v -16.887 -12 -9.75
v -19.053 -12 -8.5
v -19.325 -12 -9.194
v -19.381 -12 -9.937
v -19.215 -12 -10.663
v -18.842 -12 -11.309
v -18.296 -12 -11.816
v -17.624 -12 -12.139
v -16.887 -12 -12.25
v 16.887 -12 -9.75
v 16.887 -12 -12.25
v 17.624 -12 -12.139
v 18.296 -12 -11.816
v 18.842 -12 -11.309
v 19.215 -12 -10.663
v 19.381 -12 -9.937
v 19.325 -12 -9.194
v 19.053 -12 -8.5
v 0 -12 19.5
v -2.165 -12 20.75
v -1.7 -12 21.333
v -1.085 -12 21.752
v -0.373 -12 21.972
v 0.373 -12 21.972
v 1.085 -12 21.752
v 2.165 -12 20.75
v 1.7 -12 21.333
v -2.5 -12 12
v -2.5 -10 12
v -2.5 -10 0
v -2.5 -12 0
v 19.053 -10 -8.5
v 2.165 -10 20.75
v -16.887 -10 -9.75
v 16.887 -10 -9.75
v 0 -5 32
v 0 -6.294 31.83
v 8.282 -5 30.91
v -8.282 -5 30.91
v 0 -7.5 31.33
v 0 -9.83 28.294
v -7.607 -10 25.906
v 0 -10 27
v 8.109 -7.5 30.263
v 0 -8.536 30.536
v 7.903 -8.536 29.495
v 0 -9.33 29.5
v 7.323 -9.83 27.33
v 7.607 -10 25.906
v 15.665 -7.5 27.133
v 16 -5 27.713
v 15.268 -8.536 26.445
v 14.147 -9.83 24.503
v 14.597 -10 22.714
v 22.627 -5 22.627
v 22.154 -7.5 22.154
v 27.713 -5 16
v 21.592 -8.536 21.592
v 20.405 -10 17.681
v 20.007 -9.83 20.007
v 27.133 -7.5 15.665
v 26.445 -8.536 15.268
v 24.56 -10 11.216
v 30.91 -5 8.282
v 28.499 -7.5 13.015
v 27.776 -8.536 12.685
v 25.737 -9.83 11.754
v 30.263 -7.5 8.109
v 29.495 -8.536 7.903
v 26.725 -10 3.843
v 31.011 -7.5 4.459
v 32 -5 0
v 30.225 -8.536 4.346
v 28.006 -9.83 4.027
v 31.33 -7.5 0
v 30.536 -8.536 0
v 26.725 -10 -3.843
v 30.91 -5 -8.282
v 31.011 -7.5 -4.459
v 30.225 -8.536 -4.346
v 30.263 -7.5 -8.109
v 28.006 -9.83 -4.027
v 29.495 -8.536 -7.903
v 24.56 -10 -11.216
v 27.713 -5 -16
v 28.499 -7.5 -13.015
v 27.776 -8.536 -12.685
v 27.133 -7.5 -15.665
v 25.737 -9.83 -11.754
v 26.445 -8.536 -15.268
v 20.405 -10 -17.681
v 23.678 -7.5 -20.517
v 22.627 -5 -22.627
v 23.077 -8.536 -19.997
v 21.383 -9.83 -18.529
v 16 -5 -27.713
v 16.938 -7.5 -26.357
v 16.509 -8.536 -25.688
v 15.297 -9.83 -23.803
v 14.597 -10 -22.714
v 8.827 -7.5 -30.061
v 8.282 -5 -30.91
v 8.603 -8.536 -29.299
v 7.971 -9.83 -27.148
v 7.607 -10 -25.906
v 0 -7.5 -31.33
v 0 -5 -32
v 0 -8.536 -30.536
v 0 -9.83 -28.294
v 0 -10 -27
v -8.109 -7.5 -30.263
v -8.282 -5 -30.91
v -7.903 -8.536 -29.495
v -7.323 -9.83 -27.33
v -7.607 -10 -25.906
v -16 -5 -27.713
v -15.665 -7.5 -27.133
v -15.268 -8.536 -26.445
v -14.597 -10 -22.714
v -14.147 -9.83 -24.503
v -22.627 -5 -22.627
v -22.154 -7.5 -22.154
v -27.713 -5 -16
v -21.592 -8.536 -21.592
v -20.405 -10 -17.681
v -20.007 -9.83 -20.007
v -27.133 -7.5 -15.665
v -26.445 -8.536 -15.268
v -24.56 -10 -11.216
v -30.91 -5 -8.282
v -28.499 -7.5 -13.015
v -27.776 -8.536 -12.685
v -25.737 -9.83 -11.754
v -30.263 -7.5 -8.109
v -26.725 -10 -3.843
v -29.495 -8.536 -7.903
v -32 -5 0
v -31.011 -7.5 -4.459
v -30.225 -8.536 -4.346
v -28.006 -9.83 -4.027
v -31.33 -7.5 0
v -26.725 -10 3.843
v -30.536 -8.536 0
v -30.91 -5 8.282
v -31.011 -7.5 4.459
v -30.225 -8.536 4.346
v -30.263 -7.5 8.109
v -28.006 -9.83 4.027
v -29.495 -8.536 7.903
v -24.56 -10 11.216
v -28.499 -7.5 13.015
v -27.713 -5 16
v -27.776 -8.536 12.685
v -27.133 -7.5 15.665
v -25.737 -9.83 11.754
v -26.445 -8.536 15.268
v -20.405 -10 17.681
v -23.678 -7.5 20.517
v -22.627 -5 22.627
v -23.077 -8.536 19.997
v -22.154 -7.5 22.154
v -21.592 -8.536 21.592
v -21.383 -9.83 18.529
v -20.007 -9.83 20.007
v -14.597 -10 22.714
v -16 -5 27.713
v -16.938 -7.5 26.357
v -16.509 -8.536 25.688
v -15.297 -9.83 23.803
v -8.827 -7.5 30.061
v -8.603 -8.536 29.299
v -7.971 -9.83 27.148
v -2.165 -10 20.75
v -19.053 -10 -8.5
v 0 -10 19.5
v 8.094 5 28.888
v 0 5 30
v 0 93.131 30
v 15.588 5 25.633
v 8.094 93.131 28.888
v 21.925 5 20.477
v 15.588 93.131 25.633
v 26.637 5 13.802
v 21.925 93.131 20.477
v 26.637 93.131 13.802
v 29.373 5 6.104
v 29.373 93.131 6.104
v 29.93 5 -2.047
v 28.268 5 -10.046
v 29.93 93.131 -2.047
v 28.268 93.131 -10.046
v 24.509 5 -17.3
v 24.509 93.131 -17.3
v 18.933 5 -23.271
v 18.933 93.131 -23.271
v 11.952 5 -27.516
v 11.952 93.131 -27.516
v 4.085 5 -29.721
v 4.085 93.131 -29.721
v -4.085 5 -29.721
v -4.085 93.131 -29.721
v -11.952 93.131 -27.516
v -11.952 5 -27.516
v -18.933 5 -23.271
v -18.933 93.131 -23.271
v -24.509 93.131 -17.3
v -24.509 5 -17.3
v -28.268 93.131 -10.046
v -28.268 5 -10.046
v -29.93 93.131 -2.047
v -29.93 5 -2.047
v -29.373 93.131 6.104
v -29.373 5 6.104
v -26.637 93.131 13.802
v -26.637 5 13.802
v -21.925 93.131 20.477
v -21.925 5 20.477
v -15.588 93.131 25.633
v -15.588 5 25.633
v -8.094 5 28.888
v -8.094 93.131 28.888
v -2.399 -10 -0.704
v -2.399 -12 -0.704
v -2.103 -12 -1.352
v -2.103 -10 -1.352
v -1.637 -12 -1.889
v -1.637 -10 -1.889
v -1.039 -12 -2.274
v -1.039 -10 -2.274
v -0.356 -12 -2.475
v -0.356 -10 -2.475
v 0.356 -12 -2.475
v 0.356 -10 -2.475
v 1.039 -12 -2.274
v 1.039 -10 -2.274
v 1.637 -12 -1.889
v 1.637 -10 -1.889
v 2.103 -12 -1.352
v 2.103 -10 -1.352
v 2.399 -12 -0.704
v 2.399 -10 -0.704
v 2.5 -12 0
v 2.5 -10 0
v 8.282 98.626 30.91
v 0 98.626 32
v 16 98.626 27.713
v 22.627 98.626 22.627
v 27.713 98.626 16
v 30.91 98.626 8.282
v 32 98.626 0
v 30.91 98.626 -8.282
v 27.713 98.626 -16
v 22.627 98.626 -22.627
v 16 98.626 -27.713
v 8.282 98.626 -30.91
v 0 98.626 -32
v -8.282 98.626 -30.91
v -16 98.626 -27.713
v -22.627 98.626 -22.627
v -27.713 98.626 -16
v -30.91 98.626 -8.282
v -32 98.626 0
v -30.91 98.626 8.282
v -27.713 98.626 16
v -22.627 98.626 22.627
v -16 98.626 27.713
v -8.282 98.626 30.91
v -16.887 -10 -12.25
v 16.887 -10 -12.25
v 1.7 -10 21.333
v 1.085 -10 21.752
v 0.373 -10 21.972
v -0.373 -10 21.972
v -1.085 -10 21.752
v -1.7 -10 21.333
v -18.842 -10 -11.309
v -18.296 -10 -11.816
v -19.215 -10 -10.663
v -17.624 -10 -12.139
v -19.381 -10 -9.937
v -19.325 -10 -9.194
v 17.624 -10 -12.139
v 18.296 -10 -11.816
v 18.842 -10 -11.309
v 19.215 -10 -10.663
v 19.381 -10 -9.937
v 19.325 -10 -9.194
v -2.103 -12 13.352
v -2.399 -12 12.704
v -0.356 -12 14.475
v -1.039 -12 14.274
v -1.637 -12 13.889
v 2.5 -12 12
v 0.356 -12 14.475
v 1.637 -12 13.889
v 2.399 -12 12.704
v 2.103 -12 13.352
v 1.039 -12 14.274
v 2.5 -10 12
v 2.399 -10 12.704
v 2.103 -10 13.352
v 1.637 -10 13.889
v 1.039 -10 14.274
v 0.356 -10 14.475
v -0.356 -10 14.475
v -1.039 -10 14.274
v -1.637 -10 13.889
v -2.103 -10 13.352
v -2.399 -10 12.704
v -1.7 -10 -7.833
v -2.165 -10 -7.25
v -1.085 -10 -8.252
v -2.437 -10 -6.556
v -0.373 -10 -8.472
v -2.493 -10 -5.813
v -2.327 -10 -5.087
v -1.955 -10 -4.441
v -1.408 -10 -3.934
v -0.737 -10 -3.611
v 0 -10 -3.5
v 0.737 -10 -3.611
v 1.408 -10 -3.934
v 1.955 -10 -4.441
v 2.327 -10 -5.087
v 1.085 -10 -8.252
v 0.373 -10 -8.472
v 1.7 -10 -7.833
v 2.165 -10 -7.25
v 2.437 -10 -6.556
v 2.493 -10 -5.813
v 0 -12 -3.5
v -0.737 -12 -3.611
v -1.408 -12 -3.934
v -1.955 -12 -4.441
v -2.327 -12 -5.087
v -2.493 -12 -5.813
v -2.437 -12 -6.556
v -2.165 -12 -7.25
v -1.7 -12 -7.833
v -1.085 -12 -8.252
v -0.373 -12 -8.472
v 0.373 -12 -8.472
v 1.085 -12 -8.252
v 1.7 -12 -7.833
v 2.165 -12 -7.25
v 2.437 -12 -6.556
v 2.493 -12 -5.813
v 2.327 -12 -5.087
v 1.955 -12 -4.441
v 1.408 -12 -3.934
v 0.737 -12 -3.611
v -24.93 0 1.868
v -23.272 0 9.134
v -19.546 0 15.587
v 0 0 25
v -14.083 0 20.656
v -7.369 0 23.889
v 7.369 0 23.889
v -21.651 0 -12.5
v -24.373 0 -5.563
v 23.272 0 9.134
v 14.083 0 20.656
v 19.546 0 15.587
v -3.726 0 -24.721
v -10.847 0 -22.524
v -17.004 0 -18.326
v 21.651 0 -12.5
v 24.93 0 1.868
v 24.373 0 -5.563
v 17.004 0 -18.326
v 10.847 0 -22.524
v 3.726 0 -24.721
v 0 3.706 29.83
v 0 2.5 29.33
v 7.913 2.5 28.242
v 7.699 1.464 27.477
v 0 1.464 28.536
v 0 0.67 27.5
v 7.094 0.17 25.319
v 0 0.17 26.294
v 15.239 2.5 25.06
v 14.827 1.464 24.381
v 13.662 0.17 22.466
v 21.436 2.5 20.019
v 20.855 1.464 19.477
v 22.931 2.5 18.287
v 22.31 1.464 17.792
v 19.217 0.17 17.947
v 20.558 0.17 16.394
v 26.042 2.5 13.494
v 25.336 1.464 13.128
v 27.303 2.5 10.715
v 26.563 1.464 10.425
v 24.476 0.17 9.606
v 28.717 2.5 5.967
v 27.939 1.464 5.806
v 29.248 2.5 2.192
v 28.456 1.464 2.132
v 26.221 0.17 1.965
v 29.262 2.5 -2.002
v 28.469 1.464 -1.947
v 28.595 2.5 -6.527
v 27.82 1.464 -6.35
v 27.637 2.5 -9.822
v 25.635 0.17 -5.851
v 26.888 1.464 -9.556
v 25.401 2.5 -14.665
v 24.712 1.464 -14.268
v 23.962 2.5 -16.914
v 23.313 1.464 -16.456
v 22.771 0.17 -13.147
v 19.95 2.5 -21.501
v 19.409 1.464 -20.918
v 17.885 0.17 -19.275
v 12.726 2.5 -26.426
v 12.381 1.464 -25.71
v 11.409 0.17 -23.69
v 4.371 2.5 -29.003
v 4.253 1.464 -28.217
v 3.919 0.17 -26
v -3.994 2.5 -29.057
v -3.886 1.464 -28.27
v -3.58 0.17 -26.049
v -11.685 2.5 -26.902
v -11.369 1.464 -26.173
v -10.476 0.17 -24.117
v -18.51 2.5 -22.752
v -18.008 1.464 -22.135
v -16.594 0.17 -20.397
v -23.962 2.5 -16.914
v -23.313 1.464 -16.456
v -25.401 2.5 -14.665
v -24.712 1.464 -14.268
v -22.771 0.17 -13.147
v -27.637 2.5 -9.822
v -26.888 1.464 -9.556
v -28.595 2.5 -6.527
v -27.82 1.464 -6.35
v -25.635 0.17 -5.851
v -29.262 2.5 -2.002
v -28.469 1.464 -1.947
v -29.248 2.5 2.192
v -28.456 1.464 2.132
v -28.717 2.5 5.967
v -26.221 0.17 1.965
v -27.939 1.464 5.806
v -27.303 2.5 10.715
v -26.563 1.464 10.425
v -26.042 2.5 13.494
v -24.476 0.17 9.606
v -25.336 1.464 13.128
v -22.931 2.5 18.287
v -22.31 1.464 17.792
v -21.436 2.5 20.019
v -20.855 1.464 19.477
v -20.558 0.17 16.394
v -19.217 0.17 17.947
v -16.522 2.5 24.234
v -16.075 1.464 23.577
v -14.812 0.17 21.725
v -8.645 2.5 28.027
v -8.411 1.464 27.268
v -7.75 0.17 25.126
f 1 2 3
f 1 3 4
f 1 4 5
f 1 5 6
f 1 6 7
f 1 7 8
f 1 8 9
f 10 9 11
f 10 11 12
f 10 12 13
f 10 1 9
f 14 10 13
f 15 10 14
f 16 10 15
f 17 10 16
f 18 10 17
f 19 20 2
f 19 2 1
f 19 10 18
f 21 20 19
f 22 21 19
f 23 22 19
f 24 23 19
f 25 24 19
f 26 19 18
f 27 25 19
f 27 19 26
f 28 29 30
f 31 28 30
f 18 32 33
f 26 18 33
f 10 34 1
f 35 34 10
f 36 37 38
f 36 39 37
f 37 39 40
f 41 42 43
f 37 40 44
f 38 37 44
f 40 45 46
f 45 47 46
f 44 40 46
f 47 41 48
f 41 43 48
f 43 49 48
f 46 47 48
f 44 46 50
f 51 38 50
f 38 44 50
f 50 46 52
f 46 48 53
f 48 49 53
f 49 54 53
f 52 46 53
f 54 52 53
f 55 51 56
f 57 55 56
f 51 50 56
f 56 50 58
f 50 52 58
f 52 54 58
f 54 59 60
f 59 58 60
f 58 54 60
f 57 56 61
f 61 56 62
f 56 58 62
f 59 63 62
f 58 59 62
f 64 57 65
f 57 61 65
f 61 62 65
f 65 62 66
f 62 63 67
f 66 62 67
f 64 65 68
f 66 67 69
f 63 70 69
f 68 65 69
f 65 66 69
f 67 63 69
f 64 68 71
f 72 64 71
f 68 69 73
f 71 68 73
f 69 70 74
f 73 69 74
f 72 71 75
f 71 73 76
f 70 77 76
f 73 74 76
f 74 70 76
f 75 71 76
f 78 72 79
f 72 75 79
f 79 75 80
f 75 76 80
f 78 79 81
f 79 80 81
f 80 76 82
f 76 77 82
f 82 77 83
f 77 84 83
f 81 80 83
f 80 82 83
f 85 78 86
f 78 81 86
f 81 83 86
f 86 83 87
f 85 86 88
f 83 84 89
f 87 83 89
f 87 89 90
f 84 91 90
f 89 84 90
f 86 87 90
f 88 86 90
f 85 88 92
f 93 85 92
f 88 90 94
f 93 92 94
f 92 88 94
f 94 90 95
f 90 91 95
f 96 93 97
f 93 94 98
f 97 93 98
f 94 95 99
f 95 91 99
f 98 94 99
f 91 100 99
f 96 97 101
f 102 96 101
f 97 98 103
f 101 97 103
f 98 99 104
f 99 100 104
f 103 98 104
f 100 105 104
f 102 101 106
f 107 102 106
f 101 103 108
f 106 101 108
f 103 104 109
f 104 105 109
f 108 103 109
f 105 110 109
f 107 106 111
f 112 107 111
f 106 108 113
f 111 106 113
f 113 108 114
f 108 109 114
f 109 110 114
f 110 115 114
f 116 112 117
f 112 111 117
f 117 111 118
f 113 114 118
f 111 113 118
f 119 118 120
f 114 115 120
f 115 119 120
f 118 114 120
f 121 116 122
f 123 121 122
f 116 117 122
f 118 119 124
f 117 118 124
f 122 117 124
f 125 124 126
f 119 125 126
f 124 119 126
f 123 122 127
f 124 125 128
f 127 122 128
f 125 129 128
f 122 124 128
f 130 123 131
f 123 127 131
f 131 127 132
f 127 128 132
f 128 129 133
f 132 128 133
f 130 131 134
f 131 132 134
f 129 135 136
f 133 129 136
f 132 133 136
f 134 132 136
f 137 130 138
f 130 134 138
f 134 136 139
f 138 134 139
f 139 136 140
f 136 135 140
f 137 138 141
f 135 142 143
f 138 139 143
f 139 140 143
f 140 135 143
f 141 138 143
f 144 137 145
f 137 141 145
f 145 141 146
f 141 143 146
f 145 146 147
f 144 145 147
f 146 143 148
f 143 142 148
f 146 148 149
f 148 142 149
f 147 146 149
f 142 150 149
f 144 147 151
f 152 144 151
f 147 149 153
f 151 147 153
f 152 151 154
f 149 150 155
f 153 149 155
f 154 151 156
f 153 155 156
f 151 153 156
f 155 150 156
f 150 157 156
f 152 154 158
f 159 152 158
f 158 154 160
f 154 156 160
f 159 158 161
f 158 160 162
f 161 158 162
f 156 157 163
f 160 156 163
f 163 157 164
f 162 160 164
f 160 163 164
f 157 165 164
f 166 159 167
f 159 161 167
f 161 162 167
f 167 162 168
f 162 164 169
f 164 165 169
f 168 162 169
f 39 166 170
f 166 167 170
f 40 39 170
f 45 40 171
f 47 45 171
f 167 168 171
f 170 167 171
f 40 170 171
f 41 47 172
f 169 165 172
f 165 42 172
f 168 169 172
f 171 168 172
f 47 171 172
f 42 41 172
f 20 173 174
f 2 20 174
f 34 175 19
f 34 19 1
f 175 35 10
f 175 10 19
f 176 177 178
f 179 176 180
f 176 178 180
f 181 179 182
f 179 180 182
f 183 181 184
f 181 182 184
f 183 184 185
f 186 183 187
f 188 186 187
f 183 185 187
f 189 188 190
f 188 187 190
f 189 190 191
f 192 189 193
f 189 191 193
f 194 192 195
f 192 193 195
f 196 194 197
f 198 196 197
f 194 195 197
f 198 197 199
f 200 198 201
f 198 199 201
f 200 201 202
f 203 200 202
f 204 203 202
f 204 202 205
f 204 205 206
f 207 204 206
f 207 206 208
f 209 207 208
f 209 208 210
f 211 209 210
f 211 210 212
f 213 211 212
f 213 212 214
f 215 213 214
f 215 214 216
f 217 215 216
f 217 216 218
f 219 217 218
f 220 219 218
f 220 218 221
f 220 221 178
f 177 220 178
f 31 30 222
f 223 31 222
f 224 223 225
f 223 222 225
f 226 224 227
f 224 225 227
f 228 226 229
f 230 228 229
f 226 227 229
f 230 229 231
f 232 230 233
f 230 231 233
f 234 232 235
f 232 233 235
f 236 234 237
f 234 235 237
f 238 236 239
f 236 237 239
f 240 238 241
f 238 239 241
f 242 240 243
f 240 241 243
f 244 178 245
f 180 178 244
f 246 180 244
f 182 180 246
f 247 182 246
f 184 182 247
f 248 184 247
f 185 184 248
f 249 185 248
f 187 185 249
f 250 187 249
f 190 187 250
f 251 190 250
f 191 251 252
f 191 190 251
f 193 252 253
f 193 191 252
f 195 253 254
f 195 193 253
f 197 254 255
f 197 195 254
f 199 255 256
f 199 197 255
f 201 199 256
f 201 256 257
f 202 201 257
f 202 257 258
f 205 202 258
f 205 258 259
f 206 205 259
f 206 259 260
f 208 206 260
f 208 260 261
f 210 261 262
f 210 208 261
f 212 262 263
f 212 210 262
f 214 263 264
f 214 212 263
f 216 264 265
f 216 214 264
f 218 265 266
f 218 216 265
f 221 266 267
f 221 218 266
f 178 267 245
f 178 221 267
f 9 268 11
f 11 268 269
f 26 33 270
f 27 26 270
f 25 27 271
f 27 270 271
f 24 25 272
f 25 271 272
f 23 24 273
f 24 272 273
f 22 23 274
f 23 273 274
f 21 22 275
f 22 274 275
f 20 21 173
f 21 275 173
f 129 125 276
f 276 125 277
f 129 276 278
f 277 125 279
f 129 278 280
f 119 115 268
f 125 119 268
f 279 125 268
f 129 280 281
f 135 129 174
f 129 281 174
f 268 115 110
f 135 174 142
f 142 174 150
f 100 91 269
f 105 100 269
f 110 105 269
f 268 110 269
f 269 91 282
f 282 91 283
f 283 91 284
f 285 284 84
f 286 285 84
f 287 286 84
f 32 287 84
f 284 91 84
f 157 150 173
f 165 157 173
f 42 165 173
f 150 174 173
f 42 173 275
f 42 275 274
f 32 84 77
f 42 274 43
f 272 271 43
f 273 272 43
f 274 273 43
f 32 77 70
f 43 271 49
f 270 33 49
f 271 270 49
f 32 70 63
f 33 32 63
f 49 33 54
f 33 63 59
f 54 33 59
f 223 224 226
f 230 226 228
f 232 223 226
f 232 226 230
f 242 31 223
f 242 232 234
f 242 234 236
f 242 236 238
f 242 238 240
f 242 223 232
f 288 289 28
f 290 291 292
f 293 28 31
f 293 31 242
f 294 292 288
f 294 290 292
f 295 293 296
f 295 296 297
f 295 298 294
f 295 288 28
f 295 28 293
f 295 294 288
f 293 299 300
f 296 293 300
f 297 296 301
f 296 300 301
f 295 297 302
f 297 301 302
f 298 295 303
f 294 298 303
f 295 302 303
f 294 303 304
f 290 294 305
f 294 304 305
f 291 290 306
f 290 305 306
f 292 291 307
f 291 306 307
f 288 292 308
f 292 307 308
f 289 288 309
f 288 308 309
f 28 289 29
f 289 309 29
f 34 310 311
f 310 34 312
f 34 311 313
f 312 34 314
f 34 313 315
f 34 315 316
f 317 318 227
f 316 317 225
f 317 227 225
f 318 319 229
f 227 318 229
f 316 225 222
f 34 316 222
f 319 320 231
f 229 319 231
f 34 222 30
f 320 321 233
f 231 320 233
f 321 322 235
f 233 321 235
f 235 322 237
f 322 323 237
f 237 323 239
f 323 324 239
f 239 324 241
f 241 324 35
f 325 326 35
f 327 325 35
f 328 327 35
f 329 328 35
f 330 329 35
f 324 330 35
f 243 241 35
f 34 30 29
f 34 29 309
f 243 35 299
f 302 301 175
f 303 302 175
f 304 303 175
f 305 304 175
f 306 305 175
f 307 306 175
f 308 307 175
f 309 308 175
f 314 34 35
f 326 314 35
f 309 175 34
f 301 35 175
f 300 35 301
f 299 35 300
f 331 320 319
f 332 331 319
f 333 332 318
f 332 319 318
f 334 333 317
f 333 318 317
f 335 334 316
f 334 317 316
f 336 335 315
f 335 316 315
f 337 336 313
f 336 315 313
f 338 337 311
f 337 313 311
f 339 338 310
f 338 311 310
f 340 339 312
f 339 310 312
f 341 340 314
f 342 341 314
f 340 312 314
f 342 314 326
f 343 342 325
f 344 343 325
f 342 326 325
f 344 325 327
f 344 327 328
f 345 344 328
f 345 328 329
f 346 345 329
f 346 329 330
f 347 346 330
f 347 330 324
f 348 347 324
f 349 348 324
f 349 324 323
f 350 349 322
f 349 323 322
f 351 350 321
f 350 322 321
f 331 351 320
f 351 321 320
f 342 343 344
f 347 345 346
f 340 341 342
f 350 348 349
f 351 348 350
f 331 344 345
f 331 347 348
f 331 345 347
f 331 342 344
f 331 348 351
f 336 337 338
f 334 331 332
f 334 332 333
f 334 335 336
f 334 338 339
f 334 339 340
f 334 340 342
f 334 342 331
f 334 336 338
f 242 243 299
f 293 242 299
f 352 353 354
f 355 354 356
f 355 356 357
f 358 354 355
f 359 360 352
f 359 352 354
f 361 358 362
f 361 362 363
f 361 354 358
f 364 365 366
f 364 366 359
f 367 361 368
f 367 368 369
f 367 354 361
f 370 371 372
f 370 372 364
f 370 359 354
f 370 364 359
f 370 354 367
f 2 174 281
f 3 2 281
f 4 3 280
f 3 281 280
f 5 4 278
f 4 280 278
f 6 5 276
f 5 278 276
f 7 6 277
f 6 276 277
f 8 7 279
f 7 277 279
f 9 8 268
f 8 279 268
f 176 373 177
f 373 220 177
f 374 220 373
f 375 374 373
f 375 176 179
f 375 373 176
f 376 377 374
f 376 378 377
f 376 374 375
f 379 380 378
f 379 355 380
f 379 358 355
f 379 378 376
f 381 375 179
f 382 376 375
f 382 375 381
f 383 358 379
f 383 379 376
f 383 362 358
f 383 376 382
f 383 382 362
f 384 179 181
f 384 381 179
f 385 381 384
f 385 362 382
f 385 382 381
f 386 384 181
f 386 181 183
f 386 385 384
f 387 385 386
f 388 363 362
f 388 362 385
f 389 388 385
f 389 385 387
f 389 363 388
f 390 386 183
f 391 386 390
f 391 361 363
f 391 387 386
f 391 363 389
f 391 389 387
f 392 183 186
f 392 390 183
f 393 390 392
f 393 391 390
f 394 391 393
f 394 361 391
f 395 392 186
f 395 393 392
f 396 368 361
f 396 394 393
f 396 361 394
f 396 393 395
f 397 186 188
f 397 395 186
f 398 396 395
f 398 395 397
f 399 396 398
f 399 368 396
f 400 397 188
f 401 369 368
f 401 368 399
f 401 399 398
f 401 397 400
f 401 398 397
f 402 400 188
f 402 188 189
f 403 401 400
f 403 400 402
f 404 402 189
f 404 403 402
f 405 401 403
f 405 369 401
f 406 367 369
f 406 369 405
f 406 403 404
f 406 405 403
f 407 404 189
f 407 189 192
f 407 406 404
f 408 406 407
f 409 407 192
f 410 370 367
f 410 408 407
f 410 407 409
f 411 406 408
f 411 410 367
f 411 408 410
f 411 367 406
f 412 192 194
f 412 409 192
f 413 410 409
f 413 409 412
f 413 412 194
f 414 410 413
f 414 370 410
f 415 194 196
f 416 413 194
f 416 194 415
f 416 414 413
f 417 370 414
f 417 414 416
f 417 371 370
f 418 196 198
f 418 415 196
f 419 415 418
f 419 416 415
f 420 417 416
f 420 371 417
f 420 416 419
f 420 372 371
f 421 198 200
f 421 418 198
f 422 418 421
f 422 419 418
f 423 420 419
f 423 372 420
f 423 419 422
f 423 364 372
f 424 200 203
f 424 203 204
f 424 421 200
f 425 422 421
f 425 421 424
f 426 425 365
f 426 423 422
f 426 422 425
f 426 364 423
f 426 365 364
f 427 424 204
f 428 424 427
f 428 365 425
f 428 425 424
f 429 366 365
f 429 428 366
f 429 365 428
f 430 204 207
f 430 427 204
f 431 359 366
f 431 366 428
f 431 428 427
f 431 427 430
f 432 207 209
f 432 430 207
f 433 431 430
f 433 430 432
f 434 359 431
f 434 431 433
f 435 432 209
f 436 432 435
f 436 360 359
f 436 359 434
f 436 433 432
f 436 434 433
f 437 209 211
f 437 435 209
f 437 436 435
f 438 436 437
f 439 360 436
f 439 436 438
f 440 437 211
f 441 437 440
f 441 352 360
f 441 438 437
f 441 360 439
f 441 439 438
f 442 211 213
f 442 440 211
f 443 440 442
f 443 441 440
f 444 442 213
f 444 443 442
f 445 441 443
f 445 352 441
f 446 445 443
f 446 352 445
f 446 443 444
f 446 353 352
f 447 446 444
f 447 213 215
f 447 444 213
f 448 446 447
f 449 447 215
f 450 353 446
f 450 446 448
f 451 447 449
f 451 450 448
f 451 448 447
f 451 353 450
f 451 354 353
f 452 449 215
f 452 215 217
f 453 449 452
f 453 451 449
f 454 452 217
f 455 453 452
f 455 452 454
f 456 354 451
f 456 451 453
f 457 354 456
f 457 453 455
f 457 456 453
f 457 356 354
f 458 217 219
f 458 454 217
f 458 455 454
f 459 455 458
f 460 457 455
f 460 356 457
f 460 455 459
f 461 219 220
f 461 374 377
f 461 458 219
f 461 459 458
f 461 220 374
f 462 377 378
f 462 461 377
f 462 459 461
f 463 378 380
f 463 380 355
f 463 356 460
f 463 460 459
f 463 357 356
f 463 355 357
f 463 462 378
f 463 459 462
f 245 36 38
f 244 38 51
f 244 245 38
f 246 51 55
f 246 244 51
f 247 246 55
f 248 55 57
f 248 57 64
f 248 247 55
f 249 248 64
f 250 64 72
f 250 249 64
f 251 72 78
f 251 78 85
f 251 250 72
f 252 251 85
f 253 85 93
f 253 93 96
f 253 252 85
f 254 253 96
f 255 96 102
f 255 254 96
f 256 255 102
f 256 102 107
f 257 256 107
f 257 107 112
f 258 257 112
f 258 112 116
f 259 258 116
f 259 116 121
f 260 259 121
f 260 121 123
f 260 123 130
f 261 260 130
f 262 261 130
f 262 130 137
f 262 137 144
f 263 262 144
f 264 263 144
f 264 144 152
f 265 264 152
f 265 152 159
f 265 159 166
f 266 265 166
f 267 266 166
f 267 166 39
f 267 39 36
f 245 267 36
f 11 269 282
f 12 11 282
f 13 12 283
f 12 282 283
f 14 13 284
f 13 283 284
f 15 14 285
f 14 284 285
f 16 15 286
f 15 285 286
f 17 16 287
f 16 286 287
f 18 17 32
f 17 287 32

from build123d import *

# Parameters (mm, degrees)
SKETCH1_R           = 32
SKETCH1_R_2         = 30
BOSS_EXTRUDE1_DEPTH = 10
BOSS_EXTRUDE2_START = 100
SKETCH1_3_R         = 32
SKETCH1_3_R_2       = 30
BOSS_EXTRUDE2_DEPTH = 100
FILLET1_R           = 5
FILLET2_R           = 5
SKETCH2_R           = 2.5
BOSS_EXTRUDE3_DEPTH = 2
CHAMFER1_SIZE       = 2.5
CHAMFER1_SIZE_2     = 6.868693549


with BuildPart() as part:
    # Sketch1 → Boss-Extrude1 (new body)
    # profile 1 of 2: a face of its own
    with BuildSketch(Plane(origin=(0, 0, 0), x_dir=(1, 0, 0), z_dir=(0, 1, 0))):
        with Locations(Location((0, 0, 0), (0, 0, 270))):
            Circle(SKETCH1_R)
        Circle(SKETCH1_R_2, mode=Mode.SUBTRACT)
    # profile 2 of 2: a face of its own
    with BuildSketch(Plane(origin=(0, 0, 0), x_dir=(1, 0, 0), z_dir=(0, 1, 0))):
        Circle(SKETCH1_R_2)
    extrude(amount=-BOSS_EXTRUDE1_DEPTH)

    # Sketch1<3> → Boss-Extrude2 (add)
    with BuildSketch(Plane(origin=(0, 0, 0), x_dir=(1, 0, 0), z_dir=(0, 1, 0)).offset(BOSS_EXTRUDE2_START)):
        with Locations(Location((0, 0, 0), (0, 0, 270))):
            Circle(SKETCH1_3_R)
        with Locations(Location((0, 0, 0), (0, 0, 270))):
            Circle(SKETCH1_3_R_2, mode=Mode.SUBTRACT)
    extrude(amount=-BOSS_EXTRUDE2_DEPTH)

    # Fillet1
    fillet1_edges = [part.edges().sort_by_distance(p)[0] for p in [
        (0, 0, -30),
    ]]
    fillet(fillet1_edges, radius=FILLET1_R)

    # Fillet2
    fillet2_edges = [part.edges().sort_by_distance(p)[0] for p in [
        (0, -10, -32),
    ]]
    fillet(fillet2_edges, radius=FILLET2_R)

    # Sketch2 → Boss-Extrude3 (add)
    # profile 1 of 3: a face of its own
    with BuildSketch(Plane.XZ.offset(10)):
        with BuildLine():
            Line((-16.887495374, -12.25), (16.887495374, -12.25))
            ThreePointArc((16.887495374, -12.25), (19.052558883, -11), (19.052558883, -8.5))
            Line((19.052558883, -8.5), (2.165063509, 20.75))
            ThreePointArc((2.165063509, 20.75), (0, 22), (-2.165063509, 20.75))
            Line((-2.165063509, 20.75), (-19.052558883, -8.5))
            ThreePointArc((-19.052558883, -8.5), (-19.052558883, -11), (-16.887495374, -12.25))
        make_face()
        Polygon((-16.887495374, -9.75), (16.887495374, -9.75), (0, 19.5), align=None, mode=Mode.SUBTRACT)
    # profile 2 of 3: a face of its own
    with BuildSketch(Plane.XZ.offset(10)):
        with BuildLine():
            Line((-2.5, 12), (-2.5, 0))
            ThreePointArc((-2.5, 0), (0, -2.5), (2.5, 0))
            Line((2.5, 0), (2.5, 12))
            ThreePointArc((2.5, 12), (0, 14.5), (-2.5, 12))
        make_face()
    # profile 3 of 3: a face of its own
    with BuildSketch(Plane.XZ.offset(10)):
        with Locations(Location((0, -6, 0), (0, 0, 90))):
            Circle(SKETCH2_R)
    extrude(amount=BOSS_EXTRUDE3_DEPTH)

    # Chamfer1
    # the kernel refuses this chamfer: 6.868693549, 2.5 mm, written as the material it takes off along each edge
    with BuildSketch(Plane(origin=(0, 100, 0), x_dir=(0, 0, 1), z_dir=(-1, 0, 0))) as chamfer1_piece_1:
        Polygon((30 + CHAMFER1_SIZE, 0), (30, -CHAMFER1_SIZE_2), (30, 0), align=None)
    revolve(axis=Axis((0, 100, 0), (0, 1, 0)), mode=Mode.SUBTRACT)


solid = part.part
